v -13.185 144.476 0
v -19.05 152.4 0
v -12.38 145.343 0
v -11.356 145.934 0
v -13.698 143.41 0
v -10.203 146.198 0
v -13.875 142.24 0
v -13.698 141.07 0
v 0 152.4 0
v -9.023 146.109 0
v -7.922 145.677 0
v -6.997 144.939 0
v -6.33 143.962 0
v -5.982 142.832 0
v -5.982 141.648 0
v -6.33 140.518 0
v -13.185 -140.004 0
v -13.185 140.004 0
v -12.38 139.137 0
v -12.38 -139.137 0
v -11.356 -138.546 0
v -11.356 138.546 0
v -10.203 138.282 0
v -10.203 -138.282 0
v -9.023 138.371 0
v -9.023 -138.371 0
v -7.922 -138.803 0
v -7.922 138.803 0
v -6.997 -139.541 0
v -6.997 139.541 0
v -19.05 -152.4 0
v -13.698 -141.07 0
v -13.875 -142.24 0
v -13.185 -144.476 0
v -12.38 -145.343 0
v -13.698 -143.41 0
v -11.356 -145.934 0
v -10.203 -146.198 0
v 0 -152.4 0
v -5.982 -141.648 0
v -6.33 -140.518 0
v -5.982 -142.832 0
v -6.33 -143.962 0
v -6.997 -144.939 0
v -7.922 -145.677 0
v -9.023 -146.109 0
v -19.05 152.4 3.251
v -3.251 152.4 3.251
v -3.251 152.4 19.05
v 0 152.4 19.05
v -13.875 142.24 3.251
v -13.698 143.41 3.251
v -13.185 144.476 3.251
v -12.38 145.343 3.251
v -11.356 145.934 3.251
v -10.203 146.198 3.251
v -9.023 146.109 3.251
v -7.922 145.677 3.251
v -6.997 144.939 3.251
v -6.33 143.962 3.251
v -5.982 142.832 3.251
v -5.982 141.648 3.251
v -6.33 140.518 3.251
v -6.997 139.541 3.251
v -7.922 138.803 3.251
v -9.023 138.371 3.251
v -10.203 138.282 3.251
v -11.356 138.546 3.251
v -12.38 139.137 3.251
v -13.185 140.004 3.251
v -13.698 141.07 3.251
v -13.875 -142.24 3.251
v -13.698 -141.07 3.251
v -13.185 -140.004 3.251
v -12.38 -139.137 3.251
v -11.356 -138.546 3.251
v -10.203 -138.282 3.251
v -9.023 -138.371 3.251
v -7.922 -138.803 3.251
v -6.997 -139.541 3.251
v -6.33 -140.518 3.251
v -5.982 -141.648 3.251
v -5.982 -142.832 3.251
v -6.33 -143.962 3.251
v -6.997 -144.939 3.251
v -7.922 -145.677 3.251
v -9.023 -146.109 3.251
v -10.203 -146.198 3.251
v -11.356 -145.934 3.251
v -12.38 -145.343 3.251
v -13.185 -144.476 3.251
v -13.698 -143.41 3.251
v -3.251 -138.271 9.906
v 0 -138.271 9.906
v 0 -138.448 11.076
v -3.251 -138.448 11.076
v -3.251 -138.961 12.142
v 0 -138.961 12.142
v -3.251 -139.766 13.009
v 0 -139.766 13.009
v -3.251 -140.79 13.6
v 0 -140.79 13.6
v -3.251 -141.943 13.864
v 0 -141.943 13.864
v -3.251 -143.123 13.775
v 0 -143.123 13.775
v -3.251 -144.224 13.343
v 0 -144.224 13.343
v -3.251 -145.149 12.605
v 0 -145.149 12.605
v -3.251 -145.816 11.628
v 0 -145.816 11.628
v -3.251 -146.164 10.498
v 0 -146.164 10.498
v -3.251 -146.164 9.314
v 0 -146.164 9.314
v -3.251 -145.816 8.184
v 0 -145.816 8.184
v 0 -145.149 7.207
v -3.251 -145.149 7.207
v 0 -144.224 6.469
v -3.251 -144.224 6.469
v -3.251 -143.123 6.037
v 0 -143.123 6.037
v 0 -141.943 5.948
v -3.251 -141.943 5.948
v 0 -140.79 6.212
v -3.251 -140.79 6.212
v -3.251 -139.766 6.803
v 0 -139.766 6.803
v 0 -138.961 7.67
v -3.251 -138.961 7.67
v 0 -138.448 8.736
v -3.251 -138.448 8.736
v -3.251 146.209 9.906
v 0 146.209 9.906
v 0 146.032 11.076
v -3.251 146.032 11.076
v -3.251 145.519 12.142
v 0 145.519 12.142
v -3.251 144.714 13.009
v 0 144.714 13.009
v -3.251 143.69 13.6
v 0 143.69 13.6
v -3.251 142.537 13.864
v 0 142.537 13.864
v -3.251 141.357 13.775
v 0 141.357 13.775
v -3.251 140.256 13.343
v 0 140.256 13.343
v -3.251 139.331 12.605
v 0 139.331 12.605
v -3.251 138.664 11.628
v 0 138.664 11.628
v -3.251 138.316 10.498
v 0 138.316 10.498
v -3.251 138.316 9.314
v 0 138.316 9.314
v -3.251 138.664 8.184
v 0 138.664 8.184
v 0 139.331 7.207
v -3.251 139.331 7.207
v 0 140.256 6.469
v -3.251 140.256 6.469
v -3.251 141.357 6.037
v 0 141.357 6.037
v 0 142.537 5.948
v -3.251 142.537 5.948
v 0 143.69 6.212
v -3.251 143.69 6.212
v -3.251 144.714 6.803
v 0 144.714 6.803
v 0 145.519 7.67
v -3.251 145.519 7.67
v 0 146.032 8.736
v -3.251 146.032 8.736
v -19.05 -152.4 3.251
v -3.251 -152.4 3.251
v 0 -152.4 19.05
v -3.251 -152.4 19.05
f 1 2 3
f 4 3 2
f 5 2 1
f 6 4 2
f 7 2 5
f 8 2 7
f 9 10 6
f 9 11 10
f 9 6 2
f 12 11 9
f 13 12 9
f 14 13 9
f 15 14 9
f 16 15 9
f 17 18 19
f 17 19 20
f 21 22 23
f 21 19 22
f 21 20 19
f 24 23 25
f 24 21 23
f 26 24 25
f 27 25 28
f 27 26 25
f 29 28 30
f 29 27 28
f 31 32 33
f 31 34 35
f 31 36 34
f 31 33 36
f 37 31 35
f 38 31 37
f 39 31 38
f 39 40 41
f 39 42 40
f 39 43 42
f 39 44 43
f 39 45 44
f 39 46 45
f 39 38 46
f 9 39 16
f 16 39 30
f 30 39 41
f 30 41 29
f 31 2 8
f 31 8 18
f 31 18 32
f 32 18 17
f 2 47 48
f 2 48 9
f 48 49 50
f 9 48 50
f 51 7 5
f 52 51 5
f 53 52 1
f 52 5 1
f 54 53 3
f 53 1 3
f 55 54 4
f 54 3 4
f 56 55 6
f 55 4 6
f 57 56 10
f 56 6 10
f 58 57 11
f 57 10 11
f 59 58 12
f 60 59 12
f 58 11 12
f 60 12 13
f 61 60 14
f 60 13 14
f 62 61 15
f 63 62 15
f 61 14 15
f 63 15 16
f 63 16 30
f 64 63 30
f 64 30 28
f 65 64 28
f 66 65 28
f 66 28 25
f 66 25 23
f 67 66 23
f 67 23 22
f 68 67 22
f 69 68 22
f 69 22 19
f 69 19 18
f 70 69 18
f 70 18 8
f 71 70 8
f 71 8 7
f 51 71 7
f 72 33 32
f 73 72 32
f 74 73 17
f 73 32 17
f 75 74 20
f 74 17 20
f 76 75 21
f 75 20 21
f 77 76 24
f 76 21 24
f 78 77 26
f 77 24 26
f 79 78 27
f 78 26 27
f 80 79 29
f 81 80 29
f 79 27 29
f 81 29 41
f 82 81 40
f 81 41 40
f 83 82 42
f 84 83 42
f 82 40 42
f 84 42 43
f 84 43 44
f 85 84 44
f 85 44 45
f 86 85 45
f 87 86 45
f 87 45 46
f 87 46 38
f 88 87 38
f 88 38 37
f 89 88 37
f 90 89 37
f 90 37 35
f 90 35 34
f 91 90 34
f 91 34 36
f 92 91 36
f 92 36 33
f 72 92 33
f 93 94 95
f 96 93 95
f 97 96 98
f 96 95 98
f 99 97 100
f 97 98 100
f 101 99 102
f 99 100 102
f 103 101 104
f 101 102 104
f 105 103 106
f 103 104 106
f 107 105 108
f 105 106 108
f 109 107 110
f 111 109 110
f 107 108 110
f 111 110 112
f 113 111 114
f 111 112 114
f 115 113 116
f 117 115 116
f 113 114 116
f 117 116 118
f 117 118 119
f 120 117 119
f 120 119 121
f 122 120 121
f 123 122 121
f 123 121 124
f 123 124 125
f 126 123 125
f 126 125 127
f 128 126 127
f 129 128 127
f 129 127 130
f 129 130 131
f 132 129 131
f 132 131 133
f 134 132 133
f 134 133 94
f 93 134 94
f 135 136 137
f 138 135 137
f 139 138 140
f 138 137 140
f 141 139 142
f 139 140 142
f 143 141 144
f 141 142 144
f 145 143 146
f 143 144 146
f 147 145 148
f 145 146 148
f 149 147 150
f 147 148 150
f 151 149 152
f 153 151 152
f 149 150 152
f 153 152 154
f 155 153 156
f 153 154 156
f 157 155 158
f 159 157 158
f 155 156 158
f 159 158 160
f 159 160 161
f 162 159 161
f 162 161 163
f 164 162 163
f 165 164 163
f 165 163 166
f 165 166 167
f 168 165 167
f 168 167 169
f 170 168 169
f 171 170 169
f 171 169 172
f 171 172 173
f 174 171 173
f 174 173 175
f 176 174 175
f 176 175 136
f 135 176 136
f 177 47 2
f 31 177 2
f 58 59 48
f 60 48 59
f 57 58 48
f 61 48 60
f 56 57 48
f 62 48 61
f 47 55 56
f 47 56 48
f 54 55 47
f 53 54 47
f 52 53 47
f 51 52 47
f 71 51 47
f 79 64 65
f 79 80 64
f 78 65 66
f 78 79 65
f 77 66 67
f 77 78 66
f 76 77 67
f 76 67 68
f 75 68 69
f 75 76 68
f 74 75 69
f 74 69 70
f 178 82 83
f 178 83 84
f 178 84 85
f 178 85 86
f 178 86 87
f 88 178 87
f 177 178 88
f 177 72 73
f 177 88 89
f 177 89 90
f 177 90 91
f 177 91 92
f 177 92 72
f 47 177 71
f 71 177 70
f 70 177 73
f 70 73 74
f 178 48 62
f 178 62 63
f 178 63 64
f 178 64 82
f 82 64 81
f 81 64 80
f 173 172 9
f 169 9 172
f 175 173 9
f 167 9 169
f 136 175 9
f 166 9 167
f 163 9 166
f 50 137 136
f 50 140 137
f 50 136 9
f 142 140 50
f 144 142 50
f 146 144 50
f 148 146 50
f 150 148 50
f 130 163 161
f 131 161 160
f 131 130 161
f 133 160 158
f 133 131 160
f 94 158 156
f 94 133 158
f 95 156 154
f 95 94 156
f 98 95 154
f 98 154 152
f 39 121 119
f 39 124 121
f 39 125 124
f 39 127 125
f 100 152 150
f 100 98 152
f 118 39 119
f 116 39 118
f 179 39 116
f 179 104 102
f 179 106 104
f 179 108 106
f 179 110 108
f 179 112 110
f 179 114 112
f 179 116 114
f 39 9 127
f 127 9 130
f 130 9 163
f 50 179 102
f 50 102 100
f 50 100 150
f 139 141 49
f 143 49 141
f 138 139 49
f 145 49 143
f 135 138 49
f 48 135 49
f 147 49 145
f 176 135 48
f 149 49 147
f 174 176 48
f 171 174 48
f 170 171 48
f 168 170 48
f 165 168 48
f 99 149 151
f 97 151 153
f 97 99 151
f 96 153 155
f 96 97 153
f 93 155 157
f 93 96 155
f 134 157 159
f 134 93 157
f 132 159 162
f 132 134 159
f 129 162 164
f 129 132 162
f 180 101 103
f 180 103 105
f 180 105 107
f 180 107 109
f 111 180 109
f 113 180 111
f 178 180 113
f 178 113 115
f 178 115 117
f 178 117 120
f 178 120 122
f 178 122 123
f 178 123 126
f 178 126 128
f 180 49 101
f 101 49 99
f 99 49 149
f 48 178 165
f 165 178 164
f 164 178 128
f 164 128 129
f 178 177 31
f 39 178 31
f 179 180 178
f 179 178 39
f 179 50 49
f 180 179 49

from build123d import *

# Parameters (mm, degrees)
F1_DEPTH = 152.4
F3_D     = 7.9375
F3_DEPTH = 17.4625
F3_TIP   = 2.3846655818
F5_D     = 7.9375
F5_DEPTH = 17.4752
F5_TIP   = 2.3846655818


with BuildPart() as f1:
    # F0 (on Front) → F1 (new body, symmetric)
    with BuildSketch(Plane.XZ):
        Polygon((-19.05, 0), (0, 0), (0, 19.05), (-3.2512, 19.05), (-3.2512, 3.2512), (-19.05, 3.2512), align=None)
    extrude(amount=F1_DEPTH, both=True)

    # F3
    with Locations(Plane.XY.offset(3.2512)):
        with Locations((-9.906, -142.24), (-9.906, 142.24)):
            Hole(F3_D / 2, depth=F3_DEPTH)
            with Locations((0, 0, -(F3_DEPTH + F3_TIP / 2))):  # 118° drill point
                Cone(0, F3_D / 2, F3_TIP, mode=Mode.SUBTRACT)

    # F5
    with Locations(Plane(origin=(-3.2512, 0, 0), x_dir=(0, -1, 0), z_dir=(-1, 0, 0))):
        with Locations((-142.24, 9.906), (142.24, 9.906)):
            Hole(F5_D / 2, depth=F5_DEPTH)
            with Locations((0, 0, -(F5_DEPTH + F5_TIP / 2))):  # 118° drill point
                Cone(0, F5_D / 2, F5_TIP, mode=Mode.SUBTRACT)


solid = f1.part
